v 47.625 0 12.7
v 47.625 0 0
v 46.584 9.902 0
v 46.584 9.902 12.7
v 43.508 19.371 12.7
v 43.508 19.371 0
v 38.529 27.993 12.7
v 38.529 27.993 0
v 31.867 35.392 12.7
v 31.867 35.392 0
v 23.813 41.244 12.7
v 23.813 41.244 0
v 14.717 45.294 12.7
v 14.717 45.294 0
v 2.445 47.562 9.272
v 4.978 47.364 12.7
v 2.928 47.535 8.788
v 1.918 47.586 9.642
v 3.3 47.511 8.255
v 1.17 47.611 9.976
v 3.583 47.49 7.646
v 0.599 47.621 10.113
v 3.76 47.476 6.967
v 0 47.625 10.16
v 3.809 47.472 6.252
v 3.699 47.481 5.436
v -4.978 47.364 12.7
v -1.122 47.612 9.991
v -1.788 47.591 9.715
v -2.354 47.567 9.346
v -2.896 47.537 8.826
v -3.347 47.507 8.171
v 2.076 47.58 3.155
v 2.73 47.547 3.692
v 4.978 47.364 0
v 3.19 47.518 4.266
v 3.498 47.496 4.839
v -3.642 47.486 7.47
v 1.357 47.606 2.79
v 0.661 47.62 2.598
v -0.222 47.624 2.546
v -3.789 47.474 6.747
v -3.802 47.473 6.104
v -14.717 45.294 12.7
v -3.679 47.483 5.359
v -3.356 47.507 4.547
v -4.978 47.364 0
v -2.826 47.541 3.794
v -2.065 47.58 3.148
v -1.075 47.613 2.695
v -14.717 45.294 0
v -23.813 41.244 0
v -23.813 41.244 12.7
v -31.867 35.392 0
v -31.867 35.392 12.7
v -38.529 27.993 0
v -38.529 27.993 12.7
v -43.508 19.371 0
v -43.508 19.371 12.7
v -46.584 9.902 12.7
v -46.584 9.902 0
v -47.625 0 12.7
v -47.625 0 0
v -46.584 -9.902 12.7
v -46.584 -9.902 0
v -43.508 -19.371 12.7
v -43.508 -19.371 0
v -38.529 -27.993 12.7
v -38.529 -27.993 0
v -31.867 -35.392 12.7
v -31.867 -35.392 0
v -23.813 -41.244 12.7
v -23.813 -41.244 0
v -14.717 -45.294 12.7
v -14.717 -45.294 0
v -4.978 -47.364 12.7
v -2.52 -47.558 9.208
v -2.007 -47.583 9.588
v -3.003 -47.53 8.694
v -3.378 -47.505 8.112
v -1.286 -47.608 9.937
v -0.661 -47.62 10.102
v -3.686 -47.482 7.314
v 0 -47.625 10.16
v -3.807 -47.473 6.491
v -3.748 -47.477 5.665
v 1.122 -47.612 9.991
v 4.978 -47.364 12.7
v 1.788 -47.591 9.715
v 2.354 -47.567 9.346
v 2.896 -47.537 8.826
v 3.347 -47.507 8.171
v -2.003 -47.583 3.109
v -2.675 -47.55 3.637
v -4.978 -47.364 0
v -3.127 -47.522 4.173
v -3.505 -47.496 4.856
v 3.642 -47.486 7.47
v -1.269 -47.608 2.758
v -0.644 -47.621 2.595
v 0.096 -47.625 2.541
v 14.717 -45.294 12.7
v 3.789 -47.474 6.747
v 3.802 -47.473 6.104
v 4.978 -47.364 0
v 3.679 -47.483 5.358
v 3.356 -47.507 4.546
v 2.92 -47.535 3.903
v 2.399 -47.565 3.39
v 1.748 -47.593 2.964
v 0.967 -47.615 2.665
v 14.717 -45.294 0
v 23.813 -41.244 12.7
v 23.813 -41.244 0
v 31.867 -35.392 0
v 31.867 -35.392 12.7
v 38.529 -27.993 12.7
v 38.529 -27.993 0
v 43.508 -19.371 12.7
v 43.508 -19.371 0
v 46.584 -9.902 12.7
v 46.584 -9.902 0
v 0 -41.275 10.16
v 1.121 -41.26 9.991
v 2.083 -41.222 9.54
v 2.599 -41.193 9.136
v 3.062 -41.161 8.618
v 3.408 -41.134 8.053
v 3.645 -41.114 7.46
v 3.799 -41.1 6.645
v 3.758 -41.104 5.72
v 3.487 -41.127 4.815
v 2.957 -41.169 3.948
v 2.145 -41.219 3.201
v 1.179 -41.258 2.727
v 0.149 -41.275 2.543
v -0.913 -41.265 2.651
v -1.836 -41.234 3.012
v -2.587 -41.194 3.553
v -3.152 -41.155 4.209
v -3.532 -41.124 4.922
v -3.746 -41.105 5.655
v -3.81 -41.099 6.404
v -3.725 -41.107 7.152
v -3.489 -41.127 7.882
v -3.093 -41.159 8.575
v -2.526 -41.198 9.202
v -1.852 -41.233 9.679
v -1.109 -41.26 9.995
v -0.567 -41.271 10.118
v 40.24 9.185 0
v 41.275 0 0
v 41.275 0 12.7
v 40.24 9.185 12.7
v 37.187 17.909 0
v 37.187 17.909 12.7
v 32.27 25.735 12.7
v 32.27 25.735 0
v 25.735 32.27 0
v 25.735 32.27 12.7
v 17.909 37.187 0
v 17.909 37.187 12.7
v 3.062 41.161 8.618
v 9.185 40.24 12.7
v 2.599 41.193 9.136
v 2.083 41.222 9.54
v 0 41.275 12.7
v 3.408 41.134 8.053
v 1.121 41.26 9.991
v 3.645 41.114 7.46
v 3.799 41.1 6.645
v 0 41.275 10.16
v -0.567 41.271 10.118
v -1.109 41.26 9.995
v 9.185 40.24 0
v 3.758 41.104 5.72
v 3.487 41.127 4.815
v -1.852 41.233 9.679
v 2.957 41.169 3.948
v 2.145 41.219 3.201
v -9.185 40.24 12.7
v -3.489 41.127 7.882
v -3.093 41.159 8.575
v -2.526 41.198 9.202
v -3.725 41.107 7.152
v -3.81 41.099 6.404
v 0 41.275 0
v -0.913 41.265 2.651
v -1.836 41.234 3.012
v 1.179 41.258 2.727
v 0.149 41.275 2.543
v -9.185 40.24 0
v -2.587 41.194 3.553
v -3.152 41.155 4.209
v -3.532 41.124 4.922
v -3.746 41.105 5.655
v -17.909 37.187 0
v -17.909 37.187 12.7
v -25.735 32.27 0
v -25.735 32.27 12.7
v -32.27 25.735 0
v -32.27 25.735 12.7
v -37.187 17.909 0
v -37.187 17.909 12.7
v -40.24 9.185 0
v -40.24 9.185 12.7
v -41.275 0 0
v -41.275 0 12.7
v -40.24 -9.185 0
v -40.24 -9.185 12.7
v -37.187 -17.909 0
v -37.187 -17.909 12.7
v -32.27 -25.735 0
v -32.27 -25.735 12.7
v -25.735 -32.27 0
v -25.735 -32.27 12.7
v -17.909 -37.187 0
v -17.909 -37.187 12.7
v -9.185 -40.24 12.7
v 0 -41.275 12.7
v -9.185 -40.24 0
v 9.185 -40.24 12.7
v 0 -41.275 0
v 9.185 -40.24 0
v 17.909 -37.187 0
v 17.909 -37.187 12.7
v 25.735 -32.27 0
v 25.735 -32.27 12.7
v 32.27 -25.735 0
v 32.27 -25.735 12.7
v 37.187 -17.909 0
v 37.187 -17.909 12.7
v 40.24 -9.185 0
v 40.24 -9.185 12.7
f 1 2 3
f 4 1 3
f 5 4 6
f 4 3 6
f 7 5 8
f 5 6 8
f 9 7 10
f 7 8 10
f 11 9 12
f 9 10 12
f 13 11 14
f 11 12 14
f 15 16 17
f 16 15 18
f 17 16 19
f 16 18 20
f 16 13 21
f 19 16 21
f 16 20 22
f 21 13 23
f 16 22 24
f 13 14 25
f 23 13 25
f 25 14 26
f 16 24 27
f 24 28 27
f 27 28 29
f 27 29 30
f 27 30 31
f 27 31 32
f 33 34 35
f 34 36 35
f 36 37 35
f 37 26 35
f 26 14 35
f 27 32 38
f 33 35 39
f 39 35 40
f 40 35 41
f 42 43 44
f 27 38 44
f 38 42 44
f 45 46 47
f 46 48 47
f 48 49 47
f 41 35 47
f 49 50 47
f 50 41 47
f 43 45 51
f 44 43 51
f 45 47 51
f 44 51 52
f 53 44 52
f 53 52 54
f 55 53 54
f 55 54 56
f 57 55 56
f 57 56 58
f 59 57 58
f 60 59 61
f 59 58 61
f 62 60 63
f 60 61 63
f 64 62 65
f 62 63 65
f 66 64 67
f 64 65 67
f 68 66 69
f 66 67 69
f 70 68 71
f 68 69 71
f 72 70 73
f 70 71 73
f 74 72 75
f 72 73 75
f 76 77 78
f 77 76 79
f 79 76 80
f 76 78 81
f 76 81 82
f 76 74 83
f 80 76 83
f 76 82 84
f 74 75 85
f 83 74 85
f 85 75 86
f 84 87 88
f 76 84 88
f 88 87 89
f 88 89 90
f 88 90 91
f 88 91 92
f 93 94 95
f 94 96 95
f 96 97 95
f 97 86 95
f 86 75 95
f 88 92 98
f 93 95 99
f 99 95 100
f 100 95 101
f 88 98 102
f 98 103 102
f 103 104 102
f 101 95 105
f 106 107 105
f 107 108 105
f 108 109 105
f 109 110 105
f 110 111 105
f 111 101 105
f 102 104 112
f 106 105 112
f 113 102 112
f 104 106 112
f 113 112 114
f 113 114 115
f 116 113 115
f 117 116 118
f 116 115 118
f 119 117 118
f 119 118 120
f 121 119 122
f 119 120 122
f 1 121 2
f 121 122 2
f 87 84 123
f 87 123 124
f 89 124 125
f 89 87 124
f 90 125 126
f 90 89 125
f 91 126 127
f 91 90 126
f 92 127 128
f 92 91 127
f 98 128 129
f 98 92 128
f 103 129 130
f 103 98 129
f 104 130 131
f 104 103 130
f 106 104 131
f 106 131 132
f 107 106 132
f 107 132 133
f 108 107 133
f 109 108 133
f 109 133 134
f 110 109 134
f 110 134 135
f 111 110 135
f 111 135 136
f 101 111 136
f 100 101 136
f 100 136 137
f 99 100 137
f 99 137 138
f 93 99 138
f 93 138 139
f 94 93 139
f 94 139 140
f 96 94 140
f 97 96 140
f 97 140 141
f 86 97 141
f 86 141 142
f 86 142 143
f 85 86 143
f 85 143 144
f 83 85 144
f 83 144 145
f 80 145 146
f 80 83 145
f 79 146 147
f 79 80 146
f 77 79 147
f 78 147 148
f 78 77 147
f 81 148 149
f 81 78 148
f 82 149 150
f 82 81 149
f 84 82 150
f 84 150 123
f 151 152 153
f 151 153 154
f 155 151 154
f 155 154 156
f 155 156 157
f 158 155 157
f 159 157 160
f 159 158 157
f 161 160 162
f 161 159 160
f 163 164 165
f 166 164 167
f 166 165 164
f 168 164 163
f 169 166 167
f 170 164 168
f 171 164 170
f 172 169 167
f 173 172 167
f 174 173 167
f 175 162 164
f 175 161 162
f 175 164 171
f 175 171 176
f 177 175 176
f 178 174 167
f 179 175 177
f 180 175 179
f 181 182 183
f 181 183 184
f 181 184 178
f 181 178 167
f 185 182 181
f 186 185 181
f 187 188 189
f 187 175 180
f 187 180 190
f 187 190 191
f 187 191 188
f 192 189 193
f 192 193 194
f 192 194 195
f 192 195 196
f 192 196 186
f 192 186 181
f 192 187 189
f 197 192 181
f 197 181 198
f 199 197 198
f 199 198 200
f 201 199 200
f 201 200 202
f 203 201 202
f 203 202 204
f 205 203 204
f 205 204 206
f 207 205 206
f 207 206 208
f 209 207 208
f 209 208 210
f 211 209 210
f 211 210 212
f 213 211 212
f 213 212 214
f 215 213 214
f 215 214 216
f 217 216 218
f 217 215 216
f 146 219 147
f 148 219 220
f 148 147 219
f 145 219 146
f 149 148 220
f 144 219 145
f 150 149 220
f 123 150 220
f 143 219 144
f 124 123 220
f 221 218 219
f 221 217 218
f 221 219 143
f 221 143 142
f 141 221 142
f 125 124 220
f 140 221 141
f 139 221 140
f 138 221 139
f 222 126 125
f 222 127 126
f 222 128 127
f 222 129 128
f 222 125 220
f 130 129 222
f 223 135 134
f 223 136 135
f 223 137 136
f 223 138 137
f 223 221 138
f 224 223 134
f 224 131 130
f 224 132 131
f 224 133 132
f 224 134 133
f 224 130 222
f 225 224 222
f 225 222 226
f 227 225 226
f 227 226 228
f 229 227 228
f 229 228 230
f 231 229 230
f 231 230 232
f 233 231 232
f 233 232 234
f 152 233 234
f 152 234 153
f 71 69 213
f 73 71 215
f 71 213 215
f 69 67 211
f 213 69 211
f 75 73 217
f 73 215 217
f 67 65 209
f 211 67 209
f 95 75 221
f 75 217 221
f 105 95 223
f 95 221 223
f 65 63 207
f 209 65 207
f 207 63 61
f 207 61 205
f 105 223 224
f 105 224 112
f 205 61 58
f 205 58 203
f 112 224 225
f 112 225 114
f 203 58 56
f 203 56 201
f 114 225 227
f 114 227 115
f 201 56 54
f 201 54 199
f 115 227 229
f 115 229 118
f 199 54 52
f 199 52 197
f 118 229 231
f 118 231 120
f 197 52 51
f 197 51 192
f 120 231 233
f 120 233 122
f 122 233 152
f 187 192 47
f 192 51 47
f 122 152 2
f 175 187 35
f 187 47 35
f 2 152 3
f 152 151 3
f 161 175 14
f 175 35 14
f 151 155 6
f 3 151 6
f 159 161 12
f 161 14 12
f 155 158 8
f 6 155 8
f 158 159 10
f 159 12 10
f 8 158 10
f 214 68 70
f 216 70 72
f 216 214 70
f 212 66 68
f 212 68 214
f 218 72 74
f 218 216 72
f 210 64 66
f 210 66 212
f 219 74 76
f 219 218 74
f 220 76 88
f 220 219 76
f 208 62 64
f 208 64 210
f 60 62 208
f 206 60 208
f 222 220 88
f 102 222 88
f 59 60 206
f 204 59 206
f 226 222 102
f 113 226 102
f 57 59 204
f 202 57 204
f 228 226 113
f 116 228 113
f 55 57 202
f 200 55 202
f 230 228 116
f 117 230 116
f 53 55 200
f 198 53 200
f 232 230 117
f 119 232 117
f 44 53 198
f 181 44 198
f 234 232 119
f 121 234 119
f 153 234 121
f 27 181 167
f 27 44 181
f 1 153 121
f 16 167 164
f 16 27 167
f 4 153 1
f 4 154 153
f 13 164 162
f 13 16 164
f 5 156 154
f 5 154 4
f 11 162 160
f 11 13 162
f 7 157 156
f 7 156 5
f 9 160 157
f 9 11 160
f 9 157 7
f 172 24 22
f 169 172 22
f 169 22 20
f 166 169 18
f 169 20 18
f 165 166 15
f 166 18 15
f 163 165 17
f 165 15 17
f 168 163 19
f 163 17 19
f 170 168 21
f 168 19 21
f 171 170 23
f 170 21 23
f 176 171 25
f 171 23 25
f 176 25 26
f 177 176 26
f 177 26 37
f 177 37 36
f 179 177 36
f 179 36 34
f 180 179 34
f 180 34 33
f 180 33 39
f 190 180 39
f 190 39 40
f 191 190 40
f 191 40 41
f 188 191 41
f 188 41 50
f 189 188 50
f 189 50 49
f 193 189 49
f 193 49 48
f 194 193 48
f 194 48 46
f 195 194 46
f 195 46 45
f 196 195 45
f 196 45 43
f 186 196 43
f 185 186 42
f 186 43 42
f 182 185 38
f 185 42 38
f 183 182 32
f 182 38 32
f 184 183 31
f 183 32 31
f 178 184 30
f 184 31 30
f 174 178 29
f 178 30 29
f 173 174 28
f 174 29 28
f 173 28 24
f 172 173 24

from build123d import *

# Parameters (mm, degrees)
SKETCH1_R               = 47.625
SKETCH1_R_2             = 41.275
BOSS_EXTRUDE1_DEPTH     = 12.7
CUT_EXTRUDE1_REACH      = 109.247
CUT_EXTRUDE1_END_RADIUS = 41.275
SKETCH2_R               = 3.81


with BuildPart() as part:
    # Sketch1 → Boss-Extrude1 (new body)
    with BuildSketch(Plane.XY):
        Circle(SKETCH1_R)
        Circle(SKETCH1_R_2, mode=Mode.SUBTRACT)
    extrude(amount=BOSS_EXTRUDE1_DEPTH)

    # Cut-Extrude1: up to this cylinder (the profile starts outside it)
    cut_extrude1_end = Plane(origin=(0, 0, 6.35), z_dir=(0, 0, -1)) * Cylinder(CUT_EXTRUDE1_END_RADIUS, 302.044, mode=Mode.PRIVATE)
    # Sketch2 → Cut-Extrude1 (cut, up to the surface)
    with BuildSketch(Plane(origin=(0, 47.625, 0), x_dir=(1, 0, 0), z_dir=(0, 1, 0)), mode=Mode.PRIVATE) as cut_extrude1_sk1:
        with Locations(Location((0, -6.35, 0), (0, 0, 270))):
            Circle(SKETCH2_R)
    cut_extrude1_tool1 = extrude(cut_extrude1_sk1.sketch, amount=-CUT_EXTRUDE1_REACH, mode=Mode.PRIVATE) - cut_extrude1_end
    cut_extrude1 = cut_extrude1_tool1.solids().sort_by_distance((0, 47.625, 6.35))[0]
    add(cut_extrude1, mode=Mode.SUBTRACT)

    # Mirror1: Cut-Extrude1 across plane
    add(cut_extrude1.mirror(Plane.ZX), mode=Mode.SUBTRACT)


solid = part.part
